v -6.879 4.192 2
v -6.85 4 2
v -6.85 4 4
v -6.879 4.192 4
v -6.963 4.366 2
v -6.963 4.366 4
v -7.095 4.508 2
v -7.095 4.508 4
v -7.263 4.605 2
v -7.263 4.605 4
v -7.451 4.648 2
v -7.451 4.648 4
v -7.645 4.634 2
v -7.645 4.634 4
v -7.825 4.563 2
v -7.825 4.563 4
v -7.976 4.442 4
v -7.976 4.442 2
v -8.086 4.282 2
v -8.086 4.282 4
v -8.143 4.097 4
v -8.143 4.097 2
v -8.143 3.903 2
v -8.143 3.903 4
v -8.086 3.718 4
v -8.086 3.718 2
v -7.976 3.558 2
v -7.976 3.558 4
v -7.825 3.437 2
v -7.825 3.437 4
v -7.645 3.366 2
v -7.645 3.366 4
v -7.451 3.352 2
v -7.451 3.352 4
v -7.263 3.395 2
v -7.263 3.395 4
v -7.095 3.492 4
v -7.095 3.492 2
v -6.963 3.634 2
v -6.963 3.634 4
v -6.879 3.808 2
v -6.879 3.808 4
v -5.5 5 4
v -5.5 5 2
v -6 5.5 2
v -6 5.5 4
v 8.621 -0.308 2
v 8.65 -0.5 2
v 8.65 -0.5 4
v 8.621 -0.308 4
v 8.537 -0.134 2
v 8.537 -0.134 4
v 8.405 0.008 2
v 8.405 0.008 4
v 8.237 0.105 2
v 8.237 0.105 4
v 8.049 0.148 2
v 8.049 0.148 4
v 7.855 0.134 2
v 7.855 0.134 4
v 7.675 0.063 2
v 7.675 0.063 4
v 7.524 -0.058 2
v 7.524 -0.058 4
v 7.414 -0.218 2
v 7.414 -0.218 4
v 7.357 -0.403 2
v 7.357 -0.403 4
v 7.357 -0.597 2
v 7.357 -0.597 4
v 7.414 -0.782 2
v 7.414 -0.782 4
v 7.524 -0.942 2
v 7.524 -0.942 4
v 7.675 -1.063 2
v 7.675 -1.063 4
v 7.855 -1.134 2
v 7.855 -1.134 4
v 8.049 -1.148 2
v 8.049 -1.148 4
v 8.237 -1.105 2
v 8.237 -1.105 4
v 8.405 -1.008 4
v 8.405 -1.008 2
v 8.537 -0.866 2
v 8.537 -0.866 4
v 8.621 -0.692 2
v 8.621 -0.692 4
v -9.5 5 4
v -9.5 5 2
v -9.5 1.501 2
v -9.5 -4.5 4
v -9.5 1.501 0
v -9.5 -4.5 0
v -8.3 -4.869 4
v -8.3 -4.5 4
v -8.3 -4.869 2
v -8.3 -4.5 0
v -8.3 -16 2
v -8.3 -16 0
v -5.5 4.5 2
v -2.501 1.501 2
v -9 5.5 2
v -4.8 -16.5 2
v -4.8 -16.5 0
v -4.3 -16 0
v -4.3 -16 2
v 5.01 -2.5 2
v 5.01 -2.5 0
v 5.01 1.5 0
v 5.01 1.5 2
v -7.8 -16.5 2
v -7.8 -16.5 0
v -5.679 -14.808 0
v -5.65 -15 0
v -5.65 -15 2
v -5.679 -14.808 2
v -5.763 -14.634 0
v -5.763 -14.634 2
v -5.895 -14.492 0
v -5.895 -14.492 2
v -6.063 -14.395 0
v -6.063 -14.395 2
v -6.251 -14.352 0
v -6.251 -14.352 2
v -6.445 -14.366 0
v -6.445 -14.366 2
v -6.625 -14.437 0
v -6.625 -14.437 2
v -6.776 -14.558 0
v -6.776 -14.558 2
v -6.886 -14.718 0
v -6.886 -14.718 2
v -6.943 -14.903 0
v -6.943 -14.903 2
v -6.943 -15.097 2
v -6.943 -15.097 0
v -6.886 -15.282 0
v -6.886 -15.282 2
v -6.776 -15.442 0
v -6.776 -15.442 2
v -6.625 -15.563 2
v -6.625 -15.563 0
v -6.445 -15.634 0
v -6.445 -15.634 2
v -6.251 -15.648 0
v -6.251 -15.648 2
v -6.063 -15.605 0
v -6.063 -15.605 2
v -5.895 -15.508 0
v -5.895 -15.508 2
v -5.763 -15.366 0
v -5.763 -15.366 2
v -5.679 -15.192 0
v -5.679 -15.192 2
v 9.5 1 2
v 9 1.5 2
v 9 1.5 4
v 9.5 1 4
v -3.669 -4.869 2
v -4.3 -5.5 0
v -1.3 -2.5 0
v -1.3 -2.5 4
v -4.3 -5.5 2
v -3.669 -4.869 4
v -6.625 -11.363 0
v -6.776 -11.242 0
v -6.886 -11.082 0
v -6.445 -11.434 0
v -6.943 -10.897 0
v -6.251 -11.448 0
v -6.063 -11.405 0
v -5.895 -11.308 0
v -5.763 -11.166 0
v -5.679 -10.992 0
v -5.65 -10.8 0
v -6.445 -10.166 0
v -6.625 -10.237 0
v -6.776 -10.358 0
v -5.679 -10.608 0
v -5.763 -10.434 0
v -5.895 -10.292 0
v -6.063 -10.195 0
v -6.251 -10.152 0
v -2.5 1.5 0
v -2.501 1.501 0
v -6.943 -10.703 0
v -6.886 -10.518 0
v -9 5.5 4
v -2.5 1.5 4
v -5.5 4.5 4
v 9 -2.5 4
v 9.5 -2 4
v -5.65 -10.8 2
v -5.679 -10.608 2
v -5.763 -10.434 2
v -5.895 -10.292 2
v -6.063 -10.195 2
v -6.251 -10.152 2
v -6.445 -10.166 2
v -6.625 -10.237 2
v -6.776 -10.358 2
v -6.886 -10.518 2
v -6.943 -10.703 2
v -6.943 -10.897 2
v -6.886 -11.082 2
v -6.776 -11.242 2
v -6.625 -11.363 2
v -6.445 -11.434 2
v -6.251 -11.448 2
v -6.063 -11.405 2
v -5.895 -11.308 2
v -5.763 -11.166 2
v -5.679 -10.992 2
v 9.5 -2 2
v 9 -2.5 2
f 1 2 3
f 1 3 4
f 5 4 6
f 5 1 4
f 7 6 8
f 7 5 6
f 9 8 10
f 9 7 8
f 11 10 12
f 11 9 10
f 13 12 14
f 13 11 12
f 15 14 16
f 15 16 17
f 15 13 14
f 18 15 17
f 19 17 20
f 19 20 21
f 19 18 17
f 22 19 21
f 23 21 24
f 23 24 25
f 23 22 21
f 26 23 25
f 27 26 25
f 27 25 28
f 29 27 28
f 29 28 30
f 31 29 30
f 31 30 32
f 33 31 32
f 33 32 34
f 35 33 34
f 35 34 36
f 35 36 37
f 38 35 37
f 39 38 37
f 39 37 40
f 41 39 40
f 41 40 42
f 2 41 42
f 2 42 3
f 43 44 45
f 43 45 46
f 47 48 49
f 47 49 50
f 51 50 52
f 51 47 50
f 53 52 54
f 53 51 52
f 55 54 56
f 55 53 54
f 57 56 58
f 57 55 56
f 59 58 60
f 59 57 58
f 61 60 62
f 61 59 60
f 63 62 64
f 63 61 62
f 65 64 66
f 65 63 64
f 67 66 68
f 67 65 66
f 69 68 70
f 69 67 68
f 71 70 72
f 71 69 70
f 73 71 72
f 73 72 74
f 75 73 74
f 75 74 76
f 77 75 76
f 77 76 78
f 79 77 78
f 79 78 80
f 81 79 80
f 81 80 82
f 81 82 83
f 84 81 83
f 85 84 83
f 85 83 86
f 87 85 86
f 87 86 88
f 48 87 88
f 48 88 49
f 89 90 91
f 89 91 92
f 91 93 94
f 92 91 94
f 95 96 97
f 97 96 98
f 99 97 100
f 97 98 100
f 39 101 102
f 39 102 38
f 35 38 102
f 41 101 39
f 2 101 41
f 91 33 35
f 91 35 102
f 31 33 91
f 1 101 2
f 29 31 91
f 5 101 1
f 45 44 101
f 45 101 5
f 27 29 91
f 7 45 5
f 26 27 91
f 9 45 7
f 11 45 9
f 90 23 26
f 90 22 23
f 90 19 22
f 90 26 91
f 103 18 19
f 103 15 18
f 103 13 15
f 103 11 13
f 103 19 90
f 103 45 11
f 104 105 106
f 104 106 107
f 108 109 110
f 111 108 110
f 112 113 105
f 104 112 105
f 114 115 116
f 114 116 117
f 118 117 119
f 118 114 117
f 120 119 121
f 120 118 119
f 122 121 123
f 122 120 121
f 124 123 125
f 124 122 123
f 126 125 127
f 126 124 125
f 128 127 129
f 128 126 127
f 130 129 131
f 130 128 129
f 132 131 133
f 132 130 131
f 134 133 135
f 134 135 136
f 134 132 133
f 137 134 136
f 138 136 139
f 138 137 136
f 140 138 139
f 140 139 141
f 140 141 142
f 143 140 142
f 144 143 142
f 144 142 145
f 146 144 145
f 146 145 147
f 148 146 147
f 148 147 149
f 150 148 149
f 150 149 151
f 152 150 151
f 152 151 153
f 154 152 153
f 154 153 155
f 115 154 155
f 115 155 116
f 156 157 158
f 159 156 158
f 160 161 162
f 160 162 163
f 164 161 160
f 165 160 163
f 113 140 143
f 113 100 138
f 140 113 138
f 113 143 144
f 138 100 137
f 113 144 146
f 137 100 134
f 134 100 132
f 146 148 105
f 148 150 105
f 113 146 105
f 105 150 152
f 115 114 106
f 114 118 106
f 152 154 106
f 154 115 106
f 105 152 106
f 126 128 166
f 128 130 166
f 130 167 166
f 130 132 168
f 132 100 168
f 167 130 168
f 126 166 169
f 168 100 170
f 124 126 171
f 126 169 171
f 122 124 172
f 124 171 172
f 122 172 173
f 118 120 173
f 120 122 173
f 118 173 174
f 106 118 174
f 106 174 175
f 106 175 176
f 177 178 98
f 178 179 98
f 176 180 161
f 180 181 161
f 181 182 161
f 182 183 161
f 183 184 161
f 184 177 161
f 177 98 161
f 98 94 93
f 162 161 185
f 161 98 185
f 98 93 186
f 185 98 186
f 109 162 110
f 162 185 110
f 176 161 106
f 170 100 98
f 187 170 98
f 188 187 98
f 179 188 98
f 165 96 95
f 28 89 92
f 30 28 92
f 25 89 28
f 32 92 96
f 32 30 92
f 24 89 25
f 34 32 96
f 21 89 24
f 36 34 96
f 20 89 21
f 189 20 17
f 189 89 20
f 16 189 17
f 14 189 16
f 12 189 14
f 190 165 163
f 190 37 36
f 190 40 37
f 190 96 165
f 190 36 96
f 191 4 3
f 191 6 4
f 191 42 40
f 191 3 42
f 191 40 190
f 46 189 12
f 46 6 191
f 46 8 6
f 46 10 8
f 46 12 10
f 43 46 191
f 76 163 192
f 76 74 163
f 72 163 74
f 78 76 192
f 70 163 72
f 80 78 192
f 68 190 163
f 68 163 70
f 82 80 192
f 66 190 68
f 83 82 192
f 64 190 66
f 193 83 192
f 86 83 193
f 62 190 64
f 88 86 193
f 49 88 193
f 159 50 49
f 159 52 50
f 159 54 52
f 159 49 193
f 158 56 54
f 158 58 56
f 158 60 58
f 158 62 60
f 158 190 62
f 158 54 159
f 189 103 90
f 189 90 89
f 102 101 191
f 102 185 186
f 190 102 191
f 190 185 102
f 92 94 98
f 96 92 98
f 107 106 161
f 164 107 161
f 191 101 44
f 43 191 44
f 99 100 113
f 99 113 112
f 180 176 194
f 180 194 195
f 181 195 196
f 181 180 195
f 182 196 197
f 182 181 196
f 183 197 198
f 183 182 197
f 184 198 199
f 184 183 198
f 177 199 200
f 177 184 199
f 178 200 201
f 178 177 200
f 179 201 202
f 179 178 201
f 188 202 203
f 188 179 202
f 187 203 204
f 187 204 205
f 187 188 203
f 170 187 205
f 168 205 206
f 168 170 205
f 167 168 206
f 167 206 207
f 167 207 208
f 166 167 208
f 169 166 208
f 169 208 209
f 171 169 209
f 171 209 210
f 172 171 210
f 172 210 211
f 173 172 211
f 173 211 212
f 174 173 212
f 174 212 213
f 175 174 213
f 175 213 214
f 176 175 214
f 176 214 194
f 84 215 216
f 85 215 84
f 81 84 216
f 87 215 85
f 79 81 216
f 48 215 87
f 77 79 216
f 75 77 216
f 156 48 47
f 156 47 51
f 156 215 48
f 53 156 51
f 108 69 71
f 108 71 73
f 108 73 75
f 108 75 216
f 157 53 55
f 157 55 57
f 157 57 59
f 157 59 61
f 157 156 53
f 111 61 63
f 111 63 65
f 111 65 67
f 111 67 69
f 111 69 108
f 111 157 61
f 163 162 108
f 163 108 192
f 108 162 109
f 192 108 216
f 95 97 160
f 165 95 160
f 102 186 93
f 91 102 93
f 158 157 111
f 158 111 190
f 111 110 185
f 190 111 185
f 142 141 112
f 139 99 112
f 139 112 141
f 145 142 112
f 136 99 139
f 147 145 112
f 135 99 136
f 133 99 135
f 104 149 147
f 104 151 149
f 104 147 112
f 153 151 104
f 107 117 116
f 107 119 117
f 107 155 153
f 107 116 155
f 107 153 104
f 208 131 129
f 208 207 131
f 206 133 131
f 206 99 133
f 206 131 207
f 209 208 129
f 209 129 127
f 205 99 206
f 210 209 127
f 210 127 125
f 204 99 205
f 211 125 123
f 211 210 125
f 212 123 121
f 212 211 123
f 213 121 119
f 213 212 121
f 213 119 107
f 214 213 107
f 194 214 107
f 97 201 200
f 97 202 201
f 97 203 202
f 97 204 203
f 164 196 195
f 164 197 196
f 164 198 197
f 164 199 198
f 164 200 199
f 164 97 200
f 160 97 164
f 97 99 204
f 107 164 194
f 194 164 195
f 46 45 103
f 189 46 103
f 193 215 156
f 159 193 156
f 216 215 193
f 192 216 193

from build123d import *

# Parameters (mm, degrees)
SKETCH_1_R          = 0.65
EXTRUDE_1_DEPTH     = 4
CUT_EXTRUDE_START   = -2
SKETCH_2_W          = 4
SKETCH_2_H          = 11.631287185
SKETCH_2_R          = 0.65
CUT_EXTRUDE_1_DEPTH = 2
SKETCH_3_W          = 4.48994314
SKETCH_3_H          = 4
SKETCH_3_R          = 0.65
SKETCH_3_W_2        = 4
SKETCH_3_H_2        = 3.998874997
CUT_EXTRUDE_2_DEPTH = 2
CHAMFER_1_SIZE      = 3
CHAMFER_2_SIZE      = 0.5


with BuildPart() as part:
    # 草图1 → 凸台-拉伸1 (new body)
    with BuildSketch(Plane.XY):
        Polygon((-4.3, -2.5), (9.5, -2.5), (9.5, 1.5), (-5.5, 1.5), (-5.5, 5.5), (-9.5, 5.5), (-9.5, 1.5), (-9.5, -4.5), (-8.3, -4.5), (-8.3, -16.5), (-4.3, -16.5), align=None)
        with Locations((8, -0.5)):
            Circle(SKETCH_1_R, mode=Mode.SUBTRACT)
        with Locations((-7.5, 4)):
            Circle(SKETCH_1_R, mode=Mode.SUBTRACT)
        with Locations((-6.3, -15)):
            Circle(SKETCH_1_R, mode=Mode.SUBTRACT)
        with Locations((-6.3, -10.8)):
            Circle(SKETCH_1_R, mode=Mode.SUBTRACT)
    extrude(amount=EXTRUDE_1_DEPTH)

    # 草图2 → 切除-拉伸1 (cut)
    with BuildSketch(Plane.XY.offset(4).offset(CUT_EXTRUDE_START)):
        with Locations((-6.3, -10.684356408)):
            Rectangle(SKETCH_2_W, SKETCH_2_H)
        with Locations((-6.3, -15)):
            Circle(SKETCH_2_R, mode=Mode.SUBTRACT)
        with Locations((-6.3, -10.8)):
            Circle(SKETCH_2_R, mode=Mode.SUBTRACT)
    extrude(amount=CUT_EXTRUDE_1_DEPTH, mode=Mode.SUBTRACT)

    # 草图3 → 切除-拉伸2 (cut)
    # profile 1 of 2: a face of its own
    with BuildSketch(Plane(origin=(0, 0, 0), x_dir=(-1, 0, 0), z_dir=(0, 0, -1))):
        with Locations((-7.25502843, -0.5)):
            Rectangle(SKETCH_3_W, SKETCH_3_H)
        with Locations((-8, -0.5)):
            Circle(SKETCH_3_R, mode=Mode.SUBTRACT)
    # profile 2 of 2: a face of its own
    with BuildSketch(Plane(origin=(0, 0, 0), x_dir=(-1, 0, 0), z_dir=(0, 0, -1))):
        with Locations((7.5, 3.500562502)):
            Rectangle(SKETCH_3_W_2, SKETCH_3_H_2)
        with Locations((7.5, 4)):
            Circle(SKETCH_3_R, mode=Mode.SUBTRACT)
    extrude(amount=-CUT_EXTRUDE_2_DEPTH, mode=Mode.SUBTRACT)

    # 倒角1
    chamfer_1_edges = [part.edges().sort_by_distance(p)[0] for p in [
        (-4.3, -2.5, 2),
        (-5.5, 1.5, 2),
    ]]
    chamfer(chamfer_1_edges, length=CHAMFER_1_SIZE)

    # 倒角2
    chamfer_2_edges = [part.edges().sort_by_distance(p)[0] for p in [
        (9.5, -2.5, 3),
        (-9.5, 5.5, 3),
        (-5.5, 5.5, 3),
        (9.5, 1.5, 3),
        (-4.3, -16.5, 1),
        (-8.3, -16.5, 1),
    ]]
    chamfer(chamfer_2_edges, length=CHAMFER_2_SIZE)


solid = part.part
